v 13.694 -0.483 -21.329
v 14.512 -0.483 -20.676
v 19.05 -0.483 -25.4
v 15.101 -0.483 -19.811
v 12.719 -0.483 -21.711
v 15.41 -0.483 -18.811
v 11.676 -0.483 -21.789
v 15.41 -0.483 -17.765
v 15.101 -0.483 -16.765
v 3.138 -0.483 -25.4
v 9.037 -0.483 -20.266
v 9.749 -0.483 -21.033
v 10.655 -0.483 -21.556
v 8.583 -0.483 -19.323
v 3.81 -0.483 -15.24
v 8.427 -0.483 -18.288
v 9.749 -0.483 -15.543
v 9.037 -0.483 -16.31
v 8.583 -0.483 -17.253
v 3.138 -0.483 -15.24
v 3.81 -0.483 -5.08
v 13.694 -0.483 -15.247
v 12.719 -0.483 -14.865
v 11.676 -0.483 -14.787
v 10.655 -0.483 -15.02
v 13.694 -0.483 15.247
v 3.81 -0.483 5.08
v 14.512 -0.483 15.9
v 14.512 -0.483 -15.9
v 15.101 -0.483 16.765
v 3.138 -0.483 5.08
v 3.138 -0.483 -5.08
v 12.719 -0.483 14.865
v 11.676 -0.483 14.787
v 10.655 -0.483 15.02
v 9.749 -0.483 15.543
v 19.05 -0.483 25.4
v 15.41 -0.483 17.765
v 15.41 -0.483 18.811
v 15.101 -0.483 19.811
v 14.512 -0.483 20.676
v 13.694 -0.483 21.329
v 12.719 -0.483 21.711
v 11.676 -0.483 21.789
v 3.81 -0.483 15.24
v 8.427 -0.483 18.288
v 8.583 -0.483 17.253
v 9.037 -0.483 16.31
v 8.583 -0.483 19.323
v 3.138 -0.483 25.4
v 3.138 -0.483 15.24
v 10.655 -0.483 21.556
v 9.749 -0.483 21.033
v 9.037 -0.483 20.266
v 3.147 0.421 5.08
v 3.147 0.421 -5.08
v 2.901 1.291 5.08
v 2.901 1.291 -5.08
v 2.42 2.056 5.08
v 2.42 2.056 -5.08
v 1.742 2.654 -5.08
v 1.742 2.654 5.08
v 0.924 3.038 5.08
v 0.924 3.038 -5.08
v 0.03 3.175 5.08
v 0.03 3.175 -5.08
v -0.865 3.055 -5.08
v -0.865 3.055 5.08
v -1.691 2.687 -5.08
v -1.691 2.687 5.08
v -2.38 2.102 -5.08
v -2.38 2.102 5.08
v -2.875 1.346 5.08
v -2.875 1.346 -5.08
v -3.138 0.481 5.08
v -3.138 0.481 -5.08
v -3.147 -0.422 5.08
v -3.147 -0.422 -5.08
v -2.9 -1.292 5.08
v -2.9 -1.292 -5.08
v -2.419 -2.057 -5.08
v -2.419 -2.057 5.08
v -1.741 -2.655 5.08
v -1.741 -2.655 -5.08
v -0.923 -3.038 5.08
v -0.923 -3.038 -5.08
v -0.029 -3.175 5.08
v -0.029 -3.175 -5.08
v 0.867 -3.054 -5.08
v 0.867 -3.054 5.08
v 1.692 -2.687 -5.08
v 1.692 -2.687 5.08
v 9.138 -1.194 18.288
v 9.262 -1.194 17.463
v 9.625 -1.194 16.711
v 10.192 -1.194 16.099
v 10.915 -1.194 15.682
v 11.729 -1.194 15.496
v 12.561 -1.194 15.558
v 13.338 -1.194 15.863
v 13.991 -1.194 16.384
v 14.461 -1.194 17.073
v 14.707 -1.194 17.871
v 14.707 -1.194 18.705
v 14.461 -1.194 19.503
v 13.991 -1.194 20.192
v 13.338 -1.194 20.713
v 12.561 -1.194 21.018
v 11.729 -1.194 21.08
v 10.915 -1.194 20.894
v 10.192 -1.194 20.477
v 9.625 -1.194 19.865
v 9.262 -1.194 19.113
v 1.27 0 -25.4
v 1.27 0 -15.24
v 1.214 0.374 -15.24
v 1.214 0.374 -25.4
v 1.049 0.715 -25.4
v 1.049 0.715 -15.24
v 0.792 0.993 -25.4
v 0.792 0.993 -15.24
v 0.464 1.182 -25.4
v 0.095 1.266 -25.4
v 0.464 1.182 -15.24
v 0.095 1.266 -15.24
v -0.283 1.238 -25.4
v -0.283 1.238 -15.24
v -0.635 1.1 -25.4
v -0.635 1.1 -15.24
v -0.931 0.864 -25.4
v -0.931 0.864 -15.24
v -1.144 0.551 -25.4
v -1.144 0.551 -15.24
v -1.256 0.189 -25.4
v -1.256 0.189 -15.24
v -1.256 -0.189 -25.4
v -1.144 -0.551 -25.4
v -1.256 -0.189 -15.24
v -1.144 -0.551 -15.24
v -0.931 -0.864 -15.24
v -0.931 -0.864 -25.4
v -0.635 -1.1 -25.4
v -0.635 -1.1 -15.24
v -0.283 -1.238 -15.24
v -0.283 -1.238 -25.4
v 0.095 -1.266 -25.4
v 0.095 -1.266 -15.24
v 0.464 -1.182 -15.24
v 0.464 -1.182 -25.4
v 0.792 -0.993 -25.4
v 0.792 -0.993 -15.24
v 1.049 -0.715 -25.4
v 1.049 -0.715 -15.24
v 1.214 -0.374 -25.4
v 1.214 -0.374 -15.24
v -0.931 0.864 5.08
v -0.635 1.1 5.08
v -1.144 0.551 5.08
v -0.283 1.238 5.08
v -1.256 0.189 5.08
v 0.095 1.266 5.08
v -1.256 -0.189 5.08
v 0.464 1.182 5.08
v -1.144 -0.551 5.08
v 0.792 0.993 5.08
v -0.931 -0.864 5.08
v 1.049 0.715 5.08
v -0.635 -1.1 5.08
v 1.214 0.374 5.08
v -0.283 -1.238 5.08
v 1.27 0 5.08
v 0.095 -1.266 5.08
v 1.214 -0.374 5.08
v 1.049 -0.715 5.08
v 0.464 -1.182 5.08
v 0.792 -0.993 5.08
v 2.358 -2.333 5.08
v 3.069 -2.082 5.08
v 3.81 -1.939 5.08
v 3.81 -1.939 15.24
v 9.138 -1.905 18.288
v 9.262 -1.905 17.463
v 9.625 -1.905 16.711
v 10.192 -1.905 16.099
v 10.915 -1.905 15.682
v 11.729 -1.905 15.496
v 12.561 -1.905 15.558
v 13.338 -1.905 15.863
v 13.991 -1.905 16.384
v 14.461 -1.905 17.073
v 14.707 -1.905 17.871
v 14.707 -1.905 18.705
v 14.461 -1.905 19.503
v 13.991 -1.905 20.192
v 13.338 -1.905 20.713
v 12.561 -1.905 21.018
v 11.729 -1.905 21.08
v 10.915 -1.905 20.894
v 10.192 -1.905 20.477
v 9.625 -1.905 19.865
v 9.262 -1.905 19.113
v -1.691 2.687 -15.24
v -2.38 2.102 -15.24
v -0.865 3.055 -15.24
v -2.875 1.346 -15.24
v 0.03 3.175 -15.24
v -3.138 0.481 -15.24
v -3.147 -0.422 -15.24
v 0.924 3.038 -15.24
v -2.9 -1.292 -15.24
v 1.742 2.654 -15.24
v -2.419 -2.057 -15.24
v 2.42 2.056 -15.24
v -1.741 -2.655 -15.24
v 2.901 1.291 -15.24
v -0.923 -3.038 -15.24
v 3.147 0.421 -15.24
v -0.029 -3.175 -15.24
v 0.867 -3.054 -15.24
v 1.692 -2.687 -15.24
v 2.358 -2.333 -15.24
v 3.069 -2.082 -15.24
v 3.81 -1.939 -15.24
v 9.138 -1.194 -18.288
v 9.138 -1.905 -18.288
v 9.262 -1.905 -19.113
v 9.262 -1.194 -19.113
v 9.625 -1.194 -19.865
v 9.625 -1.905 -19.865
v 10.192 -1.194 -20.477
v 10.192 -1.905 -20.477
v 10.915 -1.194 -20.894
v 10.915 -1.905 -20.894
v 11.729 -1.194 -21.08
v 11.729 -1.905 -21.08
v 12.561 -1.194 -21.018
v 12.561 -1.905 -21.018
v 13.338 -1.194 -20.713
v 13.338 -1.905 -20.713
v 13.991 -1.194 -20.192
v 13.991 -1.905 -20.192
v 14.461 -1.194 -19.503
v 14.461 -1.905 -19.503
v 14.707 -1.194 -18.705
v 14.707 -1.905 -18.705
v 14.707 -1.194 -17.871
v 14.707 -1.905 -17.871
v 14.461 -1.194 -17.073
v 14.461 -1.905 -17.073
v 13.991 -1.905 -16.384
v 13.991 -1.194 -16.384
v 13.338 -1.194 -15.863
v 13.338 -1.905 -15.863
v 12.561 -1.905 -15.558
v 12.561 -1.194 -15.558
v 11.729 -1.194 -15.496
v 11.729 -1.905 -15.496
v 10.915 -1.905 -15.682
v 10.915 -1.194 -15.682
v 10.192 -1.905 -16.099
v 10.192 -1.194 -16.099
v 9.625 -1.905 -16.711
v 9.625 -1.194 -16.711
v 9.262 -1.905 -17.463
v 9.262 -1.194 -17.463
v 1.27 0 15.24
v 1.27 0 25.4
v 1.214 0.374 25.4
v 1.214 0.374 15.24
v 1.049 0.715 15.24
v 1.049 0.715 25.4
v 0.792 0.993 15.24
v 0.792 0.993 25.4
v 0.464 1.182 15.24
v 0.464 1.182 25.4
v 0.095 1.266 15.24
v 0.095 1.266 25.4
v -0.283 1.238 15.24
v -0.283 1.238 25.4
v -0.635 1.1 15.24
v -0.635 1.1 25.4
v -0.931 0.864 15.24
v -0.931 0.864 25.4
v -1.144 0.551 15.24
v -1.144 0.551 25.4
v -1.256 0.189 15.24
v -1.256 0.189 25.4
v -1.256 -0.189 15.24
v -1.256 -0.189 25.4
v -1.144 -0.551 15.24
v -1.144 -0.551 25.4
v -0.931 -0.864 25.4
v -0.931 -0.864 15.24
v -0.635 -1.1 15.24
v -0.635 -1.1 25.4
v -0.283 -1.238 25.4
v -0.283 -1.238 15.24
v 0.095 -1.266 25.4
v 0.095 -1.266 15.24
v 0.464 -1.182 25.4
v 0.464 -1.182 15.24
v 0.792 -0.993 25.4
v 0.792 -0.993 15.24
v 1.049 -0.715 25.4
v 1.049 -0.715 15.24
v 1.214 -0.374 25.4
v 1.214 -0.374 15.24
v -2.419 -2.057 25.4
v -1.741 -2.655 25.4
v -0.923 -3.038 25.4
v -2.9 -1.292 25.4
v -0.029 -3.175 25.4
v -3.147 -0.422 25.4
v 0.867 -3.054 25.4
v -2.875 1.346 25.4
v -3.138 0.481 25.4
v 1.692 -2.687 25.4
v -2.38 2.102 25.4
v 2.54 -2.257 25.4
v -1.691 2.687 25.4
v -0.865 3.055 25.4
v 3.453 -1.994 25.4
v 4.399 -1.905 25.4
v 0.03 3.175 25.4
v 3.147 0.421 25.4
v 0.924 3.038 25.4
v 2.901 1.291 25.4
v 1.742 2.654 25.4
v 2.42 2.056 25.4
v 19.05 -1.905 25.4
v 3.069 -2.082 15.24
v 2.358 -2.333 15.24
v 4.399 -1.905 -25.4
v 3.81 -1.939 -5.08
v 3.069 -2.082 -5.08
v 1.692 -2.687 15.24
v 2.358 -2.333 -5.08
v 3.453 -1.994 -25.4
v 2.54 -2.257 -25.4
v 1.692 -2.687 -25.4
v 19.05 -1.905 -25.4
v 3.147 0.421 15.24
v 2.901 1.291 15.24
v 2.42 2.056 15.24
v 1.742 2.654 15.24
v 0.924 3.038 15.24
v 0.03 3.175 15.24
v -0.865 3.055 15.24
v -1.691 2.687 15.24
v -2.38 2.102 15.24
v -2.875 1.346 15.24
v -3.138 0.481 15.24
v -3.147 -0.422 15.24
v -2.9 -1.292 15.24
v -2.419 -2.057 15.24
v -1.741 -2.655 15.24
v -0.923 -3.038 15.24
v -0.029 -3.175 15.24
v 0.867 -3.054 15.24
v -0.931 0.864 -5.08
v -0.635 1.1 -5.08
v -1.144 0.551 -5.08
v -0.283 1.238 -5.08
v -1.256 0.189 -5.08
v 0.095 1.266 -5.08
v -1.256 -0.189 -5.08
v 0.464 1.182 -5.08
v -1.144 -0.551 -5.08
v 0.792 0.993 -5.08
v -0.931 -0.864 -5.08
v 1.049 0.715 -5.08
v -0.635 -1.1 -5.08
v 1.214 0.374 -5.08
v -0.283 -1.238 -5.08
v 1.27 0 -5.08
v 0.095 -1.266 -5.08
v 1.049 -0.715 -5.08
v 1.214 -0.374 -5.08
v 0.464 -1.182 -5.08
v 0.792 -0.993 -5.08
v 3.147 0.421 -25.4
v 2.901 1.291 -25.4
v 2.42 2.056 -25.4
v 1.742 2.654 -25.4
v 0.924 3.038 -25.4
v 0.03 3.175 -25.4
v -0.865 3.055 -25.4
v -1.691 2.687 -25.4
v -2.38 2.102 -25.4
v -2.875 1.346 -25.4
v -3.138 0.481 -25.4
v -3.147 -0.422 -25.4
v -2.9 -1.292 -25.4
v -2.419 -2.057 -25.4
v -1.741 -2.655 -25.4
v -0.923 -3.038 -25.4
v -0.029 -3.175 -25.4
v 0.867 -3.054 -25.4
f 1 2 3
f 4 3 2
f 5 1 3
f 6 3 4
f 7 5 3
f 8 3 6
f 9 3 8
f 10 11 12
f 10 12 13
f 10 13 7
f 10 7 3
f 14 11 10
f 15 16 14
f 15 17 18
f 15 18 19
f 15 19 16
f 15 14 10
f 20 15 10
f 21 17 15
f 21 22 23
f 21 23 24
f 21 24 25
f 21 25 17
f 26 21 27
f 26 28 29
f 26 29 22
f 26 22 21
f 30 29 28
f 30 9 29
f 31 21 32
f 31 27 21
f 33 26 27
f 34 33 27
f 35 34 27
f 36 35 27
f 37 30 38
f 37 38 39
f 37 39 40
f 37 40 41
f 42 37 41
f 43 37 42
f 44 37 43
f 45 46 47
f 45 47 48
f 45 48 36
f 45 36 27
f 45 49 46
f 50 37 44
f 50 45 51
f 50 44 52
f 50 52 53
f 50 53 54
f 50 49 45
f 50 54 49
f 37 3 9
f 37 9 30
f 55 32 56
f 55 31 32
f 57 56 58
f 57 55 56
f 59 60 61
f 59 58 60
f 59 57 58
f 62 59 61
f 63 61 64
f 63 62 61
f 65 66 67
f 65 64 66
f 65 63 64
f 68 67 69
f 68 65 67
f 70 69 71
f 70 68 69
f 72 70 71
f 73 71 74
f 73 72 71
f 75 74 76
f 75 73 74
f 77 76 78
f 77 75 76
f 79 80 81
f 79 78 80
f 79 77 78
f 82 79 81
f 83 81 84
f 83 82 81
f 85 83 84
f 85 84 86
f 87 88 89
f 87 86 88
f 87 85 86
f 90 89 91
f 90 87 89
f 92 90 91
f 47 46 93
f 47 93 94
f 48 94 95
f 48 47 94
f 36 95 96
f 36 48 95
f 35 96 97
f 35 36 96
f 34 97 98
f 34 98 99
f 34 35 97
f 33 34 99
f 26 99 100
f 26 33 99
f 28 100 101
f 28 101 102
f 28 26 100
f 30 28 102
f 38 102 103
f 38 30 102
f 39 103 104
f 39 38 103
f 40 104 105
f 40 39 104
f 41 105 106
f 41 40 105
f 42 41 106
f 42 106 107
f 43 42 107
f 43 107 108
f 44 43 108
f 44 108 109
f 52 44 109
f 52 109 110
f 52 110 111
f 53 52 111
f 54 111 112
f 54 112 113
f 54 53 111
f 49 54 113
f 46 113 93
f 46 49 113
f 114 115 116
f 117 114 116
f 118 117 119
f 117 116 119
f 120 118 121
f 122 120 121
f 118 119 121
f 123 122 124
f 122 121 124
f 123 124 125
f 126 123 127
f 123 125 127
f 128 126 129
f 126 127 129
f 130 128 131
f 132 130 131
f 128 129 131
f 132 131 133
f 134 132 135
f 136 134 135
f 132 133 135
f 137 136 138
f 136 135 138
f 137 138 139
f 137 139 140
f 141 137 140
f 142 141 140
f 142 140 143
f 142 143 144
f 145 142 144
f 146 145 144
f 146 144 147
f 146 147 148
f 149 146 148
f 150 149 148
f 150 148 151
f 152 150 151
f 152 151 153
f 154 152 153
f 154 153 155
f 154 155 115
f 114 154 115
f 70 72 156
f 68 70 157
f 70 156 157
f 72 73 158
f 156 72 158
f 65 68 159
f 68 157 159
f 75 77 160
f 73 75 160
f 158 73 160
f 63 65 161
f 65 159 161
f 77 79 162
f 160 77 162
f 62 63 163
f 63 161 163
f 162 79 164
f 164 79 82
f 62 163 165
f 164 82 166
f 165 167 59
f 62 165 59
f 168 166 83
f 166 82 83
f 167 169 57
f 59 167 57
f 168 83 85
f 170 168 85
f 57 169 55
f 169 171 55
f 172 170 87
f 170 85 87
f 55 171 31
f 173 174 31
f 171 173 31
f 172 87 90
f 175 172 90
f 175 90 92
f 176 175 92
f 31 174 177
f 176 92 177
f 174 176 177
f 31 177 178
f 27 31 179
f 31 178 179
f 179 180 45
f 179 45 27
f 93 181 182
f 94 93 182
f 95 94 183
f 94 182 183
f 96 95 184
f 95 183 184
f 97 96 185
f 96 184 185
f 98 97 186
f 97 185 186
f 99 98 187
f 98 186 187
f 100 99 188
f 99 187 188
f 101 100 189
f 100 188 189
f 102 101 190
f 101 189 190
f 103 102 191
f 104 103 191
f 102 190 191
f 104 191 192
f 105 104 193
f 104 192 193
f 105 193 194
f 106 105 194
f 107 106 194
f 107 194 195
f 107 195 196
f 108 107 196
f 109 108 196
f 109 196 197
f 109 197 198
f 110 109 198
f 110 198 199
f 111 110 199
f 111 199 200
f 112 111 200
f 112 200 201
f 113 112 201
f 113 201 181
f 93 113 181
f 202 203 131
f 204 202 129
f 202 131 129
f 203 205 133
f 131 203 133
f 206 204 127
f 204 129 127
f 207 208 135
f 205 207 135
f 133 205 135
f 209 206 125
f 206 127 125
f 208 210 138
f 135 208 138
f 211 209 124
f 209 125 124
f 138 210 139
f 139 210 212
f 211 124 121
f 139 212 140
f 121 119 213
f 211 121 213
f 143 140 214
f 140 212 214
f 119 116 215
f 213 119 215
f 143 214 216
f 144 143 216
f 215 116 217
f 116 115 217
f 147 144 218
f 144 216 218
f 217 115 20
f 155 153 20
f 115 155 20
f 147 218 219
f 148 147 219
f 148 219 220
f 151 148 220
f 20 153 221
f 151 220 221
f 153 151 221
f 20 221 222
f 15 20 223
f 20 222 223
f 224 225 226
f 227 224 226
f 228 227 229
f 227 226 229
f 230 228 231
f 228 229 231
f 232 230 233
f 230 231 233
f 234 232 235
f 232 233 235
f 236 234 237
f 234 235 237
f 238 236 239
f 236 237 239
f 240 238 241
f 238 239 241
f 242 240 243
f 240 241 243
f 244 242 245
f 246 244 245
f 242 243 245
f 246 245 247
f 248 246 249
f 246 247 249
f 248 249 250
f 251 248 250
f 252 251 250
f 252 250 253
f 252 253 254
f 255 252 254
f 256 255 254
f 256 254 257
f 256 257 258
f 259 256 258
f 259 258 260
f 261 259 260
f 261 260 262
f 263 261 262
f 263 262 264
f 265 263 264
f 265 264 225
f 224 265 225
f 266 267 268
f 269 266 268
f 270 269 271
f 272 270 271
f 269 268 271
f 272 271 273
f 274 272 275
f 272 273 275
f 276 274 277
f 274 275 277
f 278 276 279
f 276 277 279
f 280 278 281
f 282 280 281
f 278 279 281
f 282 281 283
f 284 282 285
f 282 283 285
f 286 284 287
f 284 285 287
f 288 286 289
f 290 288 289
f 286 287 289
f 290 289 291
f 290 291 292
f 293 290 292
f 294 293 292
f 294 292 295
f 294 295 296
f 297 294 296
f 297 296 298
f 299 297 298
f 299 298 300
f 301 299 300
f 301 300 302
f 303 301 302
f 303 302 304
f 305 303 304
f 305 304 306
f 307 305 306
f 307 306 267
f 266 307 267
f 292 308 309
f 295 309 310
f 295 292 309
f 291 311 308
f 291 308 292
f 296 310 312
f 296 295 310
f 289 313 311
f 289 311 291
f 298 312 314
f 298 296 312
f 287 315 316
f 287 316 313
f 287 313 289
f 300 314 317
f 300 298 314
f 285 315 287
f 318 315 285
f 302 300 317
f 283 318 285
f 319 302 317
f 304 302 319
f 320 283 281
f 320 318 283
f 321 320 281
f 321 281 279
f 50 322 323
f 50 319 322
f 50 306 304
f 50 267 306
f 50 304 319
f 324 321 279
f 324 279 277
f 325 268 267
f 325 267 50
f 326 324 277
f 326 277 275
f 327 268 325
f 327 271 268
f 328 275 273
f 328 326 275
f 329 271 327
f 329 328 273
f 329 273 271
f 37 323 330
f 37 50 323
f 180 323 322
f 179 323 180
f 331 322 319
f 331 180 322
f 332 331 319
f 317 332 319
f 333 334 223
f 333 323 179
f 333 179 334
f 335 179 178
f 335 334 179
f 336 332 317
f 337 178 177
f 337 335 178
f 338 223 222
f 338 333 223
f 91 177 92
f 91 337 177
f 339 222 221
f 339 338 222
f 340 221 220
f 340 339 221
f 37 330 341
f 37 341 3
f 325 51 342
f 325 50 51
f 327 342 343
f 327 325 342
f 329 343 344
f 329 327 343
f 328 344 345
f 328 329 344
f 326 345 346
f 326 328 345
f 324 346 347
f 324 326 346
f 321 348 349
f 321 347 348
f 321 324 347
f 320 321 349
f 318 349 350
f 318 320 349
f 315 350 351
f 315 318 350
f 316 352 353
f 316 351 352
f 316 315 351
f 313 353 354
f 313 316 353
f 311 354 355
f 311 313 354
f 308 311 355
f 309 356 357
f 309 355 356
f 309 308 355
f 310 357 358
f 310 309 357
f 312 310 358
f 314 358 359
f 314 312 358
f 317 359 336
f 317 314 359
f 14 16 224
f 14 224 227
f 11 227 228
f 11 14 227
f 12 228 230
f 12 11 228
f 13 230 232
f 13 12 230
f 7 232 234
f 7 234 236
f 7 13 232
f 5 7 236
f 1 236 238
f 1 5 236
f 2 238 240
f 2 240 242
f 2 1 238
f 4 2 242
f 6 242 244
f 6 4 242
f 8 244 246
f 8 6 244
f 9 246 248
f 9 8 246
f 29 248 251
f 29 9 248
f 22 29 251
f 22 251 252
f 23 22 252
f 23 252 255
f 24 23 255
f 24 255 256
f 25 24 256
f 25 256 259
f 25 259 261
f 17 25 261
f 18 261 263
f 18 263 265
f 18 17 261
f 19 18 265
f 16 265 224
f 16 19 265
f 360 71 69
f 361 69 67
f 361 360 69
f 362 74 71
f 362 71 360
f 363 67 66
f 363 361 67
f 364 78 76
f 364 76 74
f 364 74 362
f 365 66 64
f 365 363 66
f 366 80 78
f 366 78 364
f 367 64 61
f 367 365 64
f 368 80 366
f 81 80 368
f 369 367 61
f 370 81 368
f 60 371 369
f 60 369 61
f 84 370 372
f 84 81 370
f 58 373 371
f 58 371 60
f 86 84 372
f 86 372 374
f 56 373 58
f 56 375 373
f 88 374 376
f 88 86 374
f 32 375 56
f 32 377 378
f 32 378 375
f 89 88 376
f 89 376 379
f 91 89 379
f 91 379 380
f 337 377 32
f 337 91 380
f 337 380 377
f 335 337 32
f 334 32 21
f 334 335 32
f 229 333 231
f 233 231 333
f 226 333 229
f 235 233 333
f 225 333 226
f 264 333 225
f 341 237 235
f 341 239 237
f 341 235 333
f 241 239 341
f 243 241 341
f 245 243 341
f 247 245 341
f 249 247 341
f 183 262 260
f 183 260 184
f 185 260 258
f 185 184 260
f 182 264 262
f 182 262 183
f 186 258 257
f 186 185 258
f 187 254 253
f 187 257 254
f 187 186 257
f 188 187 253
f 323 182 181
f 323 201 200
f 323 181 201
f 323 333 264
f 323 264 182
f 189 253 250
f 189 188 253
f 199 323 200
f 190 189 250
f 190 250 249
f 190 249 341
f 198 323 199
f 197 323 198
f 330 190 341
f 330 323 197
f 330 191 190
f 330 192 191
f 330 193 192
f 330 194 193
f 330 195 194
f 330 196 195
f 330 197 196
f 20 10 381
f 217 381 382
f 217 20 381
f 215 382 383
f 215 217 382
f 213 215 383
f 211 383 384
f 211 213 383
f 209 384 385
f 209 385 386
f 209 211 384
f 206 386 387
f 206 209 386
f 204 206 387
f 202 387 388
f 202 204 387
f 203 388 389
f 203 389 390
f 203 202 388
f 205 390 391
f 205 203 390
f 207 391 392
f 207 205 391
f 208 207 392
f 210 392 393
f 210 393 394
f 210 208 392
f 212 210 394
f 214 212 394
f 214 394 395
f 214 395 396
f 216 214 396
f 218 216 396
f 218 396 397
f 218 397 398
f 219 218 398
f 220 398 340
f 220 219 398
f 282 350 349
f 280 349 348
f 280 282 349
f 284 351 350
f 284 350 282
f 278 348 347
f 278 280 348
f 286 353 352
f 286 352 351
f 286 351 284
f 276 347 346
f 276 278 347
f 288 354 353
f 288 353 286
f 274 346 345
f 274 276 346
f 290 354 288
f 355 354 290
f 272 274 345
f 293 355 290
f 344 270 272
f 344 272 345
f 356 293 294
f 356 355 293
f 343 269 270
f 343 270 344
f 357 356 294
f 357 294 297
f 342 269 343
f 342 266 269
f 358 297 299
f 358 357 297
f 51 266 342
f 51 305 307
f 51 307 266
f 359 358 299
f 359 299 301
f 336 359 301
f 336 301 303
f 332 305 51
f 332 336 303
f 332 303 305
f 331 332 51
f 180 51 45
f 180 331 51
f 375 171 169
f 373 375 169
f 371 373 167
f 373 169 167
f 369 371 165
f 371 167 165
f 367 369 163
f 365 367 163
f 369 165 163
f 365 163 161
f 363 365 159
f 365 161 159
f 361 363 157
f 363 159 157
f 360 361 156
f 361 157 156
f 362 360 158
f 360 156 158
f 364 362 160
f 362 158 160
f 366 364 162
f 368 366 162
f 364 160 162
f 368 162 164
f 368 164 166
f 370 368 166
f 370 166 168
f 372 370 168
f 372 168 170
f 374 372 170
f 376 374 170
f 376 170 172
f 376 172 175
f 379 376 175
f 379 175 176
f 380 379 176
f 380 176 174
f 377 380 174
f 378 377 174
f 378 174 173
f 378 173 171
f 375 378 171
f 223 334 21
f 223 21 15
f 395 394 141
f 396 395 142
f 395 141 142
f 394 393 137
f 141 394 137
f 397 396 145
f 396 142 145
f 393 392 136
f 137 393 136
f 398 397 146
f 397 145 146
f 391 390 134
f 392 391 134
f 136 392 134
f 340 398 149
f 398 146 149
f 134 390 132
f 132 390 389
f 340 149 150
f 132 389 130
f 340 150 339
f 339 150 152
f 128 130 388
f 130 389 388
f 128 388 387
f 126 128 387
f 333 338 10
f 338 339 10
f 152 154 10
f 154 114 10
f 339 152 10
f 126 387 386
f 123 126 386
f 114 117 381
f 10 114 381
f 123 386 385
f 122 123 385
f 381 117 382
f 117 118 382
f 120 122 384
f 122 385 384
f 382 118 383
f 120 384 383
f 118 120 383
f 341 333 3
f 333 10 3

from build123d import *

# Parameters (mm, degrees)
SKETCH4_R               = 3.175
BOSS_EXTRUDE2_DEPTH     = 25.4
FILLET1_R               = 5.08
M5_CLEARANCE_HOLE1_D    = 5.6
CUT_EXTRUDE1_DEPTH      = 32.908355123
CUT_EXTRUDE1_DEPTH_BACK = 32.908355123
SKETCH9_W               = 6.985
SKETCH9_H               = 10.16
SKETCH10_R              = 1.27
CUT_EXTRUDE2_DEPTH      = 55.347245805
CHAMFER1_SIZE           = 0.7112


with BuildPart() as part:
    # Sketch4 → Boss-Extrude2 (new, symmetric)
    with BuildSketch(Plane.XY):
        Circle(SKETCH4_R)
        with BuildLine():
            Line((19.050000043, -1.905), (19.050000043, -0.4826))
            Line((19.050000043, -0.4826), (3.138108067, -0.4826))
            ThreePointArc((3.138108067, -0.4826), (2.926778646, -1.230687513), (2.54, -1.905))
            Line((2.54, -1.905), (19.050000043, -1.905))
        make_face()
    extrude(amount=BOSS_EXTRUDE2_DEPTH, both=True)

    # Fillet1
    fillet1_edges = [part.edges().sort_by_distance(p)[0] for p in [
        (2.54, -1.905, 0),
    ]]
    fillet(fillet1_edges, radius=FILLET1_R)

    # M5 Clearance Hole1 (through all)
    with Locations(Plane(origin=(0, -0.4826, 0), x_dir=(1, 0, 0), z_dir=(0, 1, 0))):
        with Locations((11.938000043, 18.288), (11.938000043, -18.288)):
            Hole(M5_CLEARANCE_HOLE1_D / 2)

    # Sketch9 → Cut-Extrude1 (cut, two sides: drawn at the far end of the back side and taken through both)
    with BuildSketch(Plane(origin=(0, 0, 0), x_dir=(1, 0, 0), z_dir=(0, 1, 0)).offset(-CUT_EXTRUDE1_DEPTH_BACK)):
        with Locations((0.3175, 10.16)):
            Rectangle(SKETCH9_W, SKETCH9_H)
        with Locations((0.3175, -10.16)):
            Rectangle(SKETCH9_W, SKETCH9_H)
    extrude(amount=CUT_EXTRUDE1_DEPTH + CUT_EXTRUDE1_DEPTH_BACK, mode=Mode.SUBTRACT)

    # Sketch10 → Cut-Extrude2 (cut, through all)
    with BuildSketch(Plane.XY.offset(25.4)):
        Circle(SKETCH10_R)
    extrude(amount=-CUT_EXTRUDE2_DEPTH, mode=Mode.SUBTRACT)

    # Chamfer1
    chamfer1_edges = [part.edges().sort_by_distance(p)[0] for p in [
        (14.738000043, -0.4826, 18.288),
        (14.738000043, -0.4826, -18.288),
    ]]
    chamfer(chamfer1_edges, length=CHAMFER1_SIZE)


solid = part.part
